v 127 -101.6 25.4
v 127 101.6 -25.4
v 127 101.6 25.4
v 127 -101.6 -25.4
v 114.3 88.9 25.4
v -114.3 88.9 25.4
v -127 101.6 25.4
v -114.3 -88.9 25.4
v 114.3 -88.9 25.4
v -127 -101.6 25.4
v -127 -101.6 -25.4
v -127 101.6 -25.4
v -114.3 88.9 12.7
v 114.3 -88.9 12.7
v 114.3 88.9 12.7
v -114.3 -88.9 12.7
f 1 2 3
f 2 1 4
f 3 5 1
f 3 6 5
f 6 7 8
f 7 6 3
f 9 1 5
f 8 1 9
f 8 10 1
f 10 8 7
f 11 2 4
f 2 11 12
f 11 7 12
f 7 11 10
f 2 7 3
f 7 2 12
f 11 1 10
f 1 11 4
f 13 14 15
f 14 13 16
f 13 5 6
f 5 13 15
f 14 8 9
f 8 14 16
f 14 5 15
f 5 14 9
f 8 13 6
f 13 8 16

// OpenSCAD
// --- Print Settings & Constraints ---
printbedlimit = 256; // Max print bed dimension (unused in current geometry)
wallThickness = 3;   // Wall thickness in mm
unit = 25.4;         // Unit conversion (mm -> inches usually, but here used as mm base?)

// Kiln Dimensions (in mm based on unit)
kilnThickness = 2 * unit;     // ~50.8mm
kilnHeight = 8 * unit;
kilnWidth = 10 * unit;
ledgeDepth = unit;            // 25.4mm
ridgeSize = 10;               // Ridge height/size
ridgeGap = 10;                // Gap between ridges (currently unused in loop step)

// --- Construction Logic ---
difference() {
    // Main Kiln Shell
    color("red") 
    cube([kilnWidth, kilnHeight, kilnThickness], center = true);

//    // Subtract inner cavity/ledges
    color("green")
    translate([0, 0, unit]) // Shift by wall thickness + ledge? (Logic dependent on specific design intent)
    cube([kilnWidth - (1.5 * ledgeDepth), kilnHeight - ledgeDepth, unit], center = true);

//    // Subtract top ledges
    color("yellow") 
    translate([0, 0, ledgeDepth])
    cube([kilnWidth - ledgeDepth, kilnHeight - ledgeDepth, ledgeDepth], center = true);
//    
//    // --- Ridge Generation ---
//    color("brown")
//    for (ridge = [0 : 5]) {
//        // Improved logic to include ridgeGap in the spacing calculation
//        // translate([0, ridge * (ridgeSize + ridgeGap), 0])
//        // If you want ridges tightly packed without gaps: translate([0, ridge * ridgeSize, 0])
//        translate([0, ridge * (ridgeSize + ridgeGap), 0]) {
//            difference() {
//                color("blue")
//                cube([wallThickness, wallThickness, ridgeSize], center = true); // Adjusted size based on input
//
//                // Subtract internal ledge of the ridge
//                color("lightgray")
//                translate([0, unit/2 + wallThickness]) 
//                cube([unit - (1.5 * ledgeDepth), ledgeDepth + 3, wallThickness], center = false);
//
//                // Subtract second ledge layer?
//                color("gray")
//                translate([0, unit/2 + wallThickness + ledgeDepth + 3])
//                cube([unit - (1.5 * ridgeGap), ledgeDepth, wallThickness], center = true);
//            }
//        }
//    }
}
